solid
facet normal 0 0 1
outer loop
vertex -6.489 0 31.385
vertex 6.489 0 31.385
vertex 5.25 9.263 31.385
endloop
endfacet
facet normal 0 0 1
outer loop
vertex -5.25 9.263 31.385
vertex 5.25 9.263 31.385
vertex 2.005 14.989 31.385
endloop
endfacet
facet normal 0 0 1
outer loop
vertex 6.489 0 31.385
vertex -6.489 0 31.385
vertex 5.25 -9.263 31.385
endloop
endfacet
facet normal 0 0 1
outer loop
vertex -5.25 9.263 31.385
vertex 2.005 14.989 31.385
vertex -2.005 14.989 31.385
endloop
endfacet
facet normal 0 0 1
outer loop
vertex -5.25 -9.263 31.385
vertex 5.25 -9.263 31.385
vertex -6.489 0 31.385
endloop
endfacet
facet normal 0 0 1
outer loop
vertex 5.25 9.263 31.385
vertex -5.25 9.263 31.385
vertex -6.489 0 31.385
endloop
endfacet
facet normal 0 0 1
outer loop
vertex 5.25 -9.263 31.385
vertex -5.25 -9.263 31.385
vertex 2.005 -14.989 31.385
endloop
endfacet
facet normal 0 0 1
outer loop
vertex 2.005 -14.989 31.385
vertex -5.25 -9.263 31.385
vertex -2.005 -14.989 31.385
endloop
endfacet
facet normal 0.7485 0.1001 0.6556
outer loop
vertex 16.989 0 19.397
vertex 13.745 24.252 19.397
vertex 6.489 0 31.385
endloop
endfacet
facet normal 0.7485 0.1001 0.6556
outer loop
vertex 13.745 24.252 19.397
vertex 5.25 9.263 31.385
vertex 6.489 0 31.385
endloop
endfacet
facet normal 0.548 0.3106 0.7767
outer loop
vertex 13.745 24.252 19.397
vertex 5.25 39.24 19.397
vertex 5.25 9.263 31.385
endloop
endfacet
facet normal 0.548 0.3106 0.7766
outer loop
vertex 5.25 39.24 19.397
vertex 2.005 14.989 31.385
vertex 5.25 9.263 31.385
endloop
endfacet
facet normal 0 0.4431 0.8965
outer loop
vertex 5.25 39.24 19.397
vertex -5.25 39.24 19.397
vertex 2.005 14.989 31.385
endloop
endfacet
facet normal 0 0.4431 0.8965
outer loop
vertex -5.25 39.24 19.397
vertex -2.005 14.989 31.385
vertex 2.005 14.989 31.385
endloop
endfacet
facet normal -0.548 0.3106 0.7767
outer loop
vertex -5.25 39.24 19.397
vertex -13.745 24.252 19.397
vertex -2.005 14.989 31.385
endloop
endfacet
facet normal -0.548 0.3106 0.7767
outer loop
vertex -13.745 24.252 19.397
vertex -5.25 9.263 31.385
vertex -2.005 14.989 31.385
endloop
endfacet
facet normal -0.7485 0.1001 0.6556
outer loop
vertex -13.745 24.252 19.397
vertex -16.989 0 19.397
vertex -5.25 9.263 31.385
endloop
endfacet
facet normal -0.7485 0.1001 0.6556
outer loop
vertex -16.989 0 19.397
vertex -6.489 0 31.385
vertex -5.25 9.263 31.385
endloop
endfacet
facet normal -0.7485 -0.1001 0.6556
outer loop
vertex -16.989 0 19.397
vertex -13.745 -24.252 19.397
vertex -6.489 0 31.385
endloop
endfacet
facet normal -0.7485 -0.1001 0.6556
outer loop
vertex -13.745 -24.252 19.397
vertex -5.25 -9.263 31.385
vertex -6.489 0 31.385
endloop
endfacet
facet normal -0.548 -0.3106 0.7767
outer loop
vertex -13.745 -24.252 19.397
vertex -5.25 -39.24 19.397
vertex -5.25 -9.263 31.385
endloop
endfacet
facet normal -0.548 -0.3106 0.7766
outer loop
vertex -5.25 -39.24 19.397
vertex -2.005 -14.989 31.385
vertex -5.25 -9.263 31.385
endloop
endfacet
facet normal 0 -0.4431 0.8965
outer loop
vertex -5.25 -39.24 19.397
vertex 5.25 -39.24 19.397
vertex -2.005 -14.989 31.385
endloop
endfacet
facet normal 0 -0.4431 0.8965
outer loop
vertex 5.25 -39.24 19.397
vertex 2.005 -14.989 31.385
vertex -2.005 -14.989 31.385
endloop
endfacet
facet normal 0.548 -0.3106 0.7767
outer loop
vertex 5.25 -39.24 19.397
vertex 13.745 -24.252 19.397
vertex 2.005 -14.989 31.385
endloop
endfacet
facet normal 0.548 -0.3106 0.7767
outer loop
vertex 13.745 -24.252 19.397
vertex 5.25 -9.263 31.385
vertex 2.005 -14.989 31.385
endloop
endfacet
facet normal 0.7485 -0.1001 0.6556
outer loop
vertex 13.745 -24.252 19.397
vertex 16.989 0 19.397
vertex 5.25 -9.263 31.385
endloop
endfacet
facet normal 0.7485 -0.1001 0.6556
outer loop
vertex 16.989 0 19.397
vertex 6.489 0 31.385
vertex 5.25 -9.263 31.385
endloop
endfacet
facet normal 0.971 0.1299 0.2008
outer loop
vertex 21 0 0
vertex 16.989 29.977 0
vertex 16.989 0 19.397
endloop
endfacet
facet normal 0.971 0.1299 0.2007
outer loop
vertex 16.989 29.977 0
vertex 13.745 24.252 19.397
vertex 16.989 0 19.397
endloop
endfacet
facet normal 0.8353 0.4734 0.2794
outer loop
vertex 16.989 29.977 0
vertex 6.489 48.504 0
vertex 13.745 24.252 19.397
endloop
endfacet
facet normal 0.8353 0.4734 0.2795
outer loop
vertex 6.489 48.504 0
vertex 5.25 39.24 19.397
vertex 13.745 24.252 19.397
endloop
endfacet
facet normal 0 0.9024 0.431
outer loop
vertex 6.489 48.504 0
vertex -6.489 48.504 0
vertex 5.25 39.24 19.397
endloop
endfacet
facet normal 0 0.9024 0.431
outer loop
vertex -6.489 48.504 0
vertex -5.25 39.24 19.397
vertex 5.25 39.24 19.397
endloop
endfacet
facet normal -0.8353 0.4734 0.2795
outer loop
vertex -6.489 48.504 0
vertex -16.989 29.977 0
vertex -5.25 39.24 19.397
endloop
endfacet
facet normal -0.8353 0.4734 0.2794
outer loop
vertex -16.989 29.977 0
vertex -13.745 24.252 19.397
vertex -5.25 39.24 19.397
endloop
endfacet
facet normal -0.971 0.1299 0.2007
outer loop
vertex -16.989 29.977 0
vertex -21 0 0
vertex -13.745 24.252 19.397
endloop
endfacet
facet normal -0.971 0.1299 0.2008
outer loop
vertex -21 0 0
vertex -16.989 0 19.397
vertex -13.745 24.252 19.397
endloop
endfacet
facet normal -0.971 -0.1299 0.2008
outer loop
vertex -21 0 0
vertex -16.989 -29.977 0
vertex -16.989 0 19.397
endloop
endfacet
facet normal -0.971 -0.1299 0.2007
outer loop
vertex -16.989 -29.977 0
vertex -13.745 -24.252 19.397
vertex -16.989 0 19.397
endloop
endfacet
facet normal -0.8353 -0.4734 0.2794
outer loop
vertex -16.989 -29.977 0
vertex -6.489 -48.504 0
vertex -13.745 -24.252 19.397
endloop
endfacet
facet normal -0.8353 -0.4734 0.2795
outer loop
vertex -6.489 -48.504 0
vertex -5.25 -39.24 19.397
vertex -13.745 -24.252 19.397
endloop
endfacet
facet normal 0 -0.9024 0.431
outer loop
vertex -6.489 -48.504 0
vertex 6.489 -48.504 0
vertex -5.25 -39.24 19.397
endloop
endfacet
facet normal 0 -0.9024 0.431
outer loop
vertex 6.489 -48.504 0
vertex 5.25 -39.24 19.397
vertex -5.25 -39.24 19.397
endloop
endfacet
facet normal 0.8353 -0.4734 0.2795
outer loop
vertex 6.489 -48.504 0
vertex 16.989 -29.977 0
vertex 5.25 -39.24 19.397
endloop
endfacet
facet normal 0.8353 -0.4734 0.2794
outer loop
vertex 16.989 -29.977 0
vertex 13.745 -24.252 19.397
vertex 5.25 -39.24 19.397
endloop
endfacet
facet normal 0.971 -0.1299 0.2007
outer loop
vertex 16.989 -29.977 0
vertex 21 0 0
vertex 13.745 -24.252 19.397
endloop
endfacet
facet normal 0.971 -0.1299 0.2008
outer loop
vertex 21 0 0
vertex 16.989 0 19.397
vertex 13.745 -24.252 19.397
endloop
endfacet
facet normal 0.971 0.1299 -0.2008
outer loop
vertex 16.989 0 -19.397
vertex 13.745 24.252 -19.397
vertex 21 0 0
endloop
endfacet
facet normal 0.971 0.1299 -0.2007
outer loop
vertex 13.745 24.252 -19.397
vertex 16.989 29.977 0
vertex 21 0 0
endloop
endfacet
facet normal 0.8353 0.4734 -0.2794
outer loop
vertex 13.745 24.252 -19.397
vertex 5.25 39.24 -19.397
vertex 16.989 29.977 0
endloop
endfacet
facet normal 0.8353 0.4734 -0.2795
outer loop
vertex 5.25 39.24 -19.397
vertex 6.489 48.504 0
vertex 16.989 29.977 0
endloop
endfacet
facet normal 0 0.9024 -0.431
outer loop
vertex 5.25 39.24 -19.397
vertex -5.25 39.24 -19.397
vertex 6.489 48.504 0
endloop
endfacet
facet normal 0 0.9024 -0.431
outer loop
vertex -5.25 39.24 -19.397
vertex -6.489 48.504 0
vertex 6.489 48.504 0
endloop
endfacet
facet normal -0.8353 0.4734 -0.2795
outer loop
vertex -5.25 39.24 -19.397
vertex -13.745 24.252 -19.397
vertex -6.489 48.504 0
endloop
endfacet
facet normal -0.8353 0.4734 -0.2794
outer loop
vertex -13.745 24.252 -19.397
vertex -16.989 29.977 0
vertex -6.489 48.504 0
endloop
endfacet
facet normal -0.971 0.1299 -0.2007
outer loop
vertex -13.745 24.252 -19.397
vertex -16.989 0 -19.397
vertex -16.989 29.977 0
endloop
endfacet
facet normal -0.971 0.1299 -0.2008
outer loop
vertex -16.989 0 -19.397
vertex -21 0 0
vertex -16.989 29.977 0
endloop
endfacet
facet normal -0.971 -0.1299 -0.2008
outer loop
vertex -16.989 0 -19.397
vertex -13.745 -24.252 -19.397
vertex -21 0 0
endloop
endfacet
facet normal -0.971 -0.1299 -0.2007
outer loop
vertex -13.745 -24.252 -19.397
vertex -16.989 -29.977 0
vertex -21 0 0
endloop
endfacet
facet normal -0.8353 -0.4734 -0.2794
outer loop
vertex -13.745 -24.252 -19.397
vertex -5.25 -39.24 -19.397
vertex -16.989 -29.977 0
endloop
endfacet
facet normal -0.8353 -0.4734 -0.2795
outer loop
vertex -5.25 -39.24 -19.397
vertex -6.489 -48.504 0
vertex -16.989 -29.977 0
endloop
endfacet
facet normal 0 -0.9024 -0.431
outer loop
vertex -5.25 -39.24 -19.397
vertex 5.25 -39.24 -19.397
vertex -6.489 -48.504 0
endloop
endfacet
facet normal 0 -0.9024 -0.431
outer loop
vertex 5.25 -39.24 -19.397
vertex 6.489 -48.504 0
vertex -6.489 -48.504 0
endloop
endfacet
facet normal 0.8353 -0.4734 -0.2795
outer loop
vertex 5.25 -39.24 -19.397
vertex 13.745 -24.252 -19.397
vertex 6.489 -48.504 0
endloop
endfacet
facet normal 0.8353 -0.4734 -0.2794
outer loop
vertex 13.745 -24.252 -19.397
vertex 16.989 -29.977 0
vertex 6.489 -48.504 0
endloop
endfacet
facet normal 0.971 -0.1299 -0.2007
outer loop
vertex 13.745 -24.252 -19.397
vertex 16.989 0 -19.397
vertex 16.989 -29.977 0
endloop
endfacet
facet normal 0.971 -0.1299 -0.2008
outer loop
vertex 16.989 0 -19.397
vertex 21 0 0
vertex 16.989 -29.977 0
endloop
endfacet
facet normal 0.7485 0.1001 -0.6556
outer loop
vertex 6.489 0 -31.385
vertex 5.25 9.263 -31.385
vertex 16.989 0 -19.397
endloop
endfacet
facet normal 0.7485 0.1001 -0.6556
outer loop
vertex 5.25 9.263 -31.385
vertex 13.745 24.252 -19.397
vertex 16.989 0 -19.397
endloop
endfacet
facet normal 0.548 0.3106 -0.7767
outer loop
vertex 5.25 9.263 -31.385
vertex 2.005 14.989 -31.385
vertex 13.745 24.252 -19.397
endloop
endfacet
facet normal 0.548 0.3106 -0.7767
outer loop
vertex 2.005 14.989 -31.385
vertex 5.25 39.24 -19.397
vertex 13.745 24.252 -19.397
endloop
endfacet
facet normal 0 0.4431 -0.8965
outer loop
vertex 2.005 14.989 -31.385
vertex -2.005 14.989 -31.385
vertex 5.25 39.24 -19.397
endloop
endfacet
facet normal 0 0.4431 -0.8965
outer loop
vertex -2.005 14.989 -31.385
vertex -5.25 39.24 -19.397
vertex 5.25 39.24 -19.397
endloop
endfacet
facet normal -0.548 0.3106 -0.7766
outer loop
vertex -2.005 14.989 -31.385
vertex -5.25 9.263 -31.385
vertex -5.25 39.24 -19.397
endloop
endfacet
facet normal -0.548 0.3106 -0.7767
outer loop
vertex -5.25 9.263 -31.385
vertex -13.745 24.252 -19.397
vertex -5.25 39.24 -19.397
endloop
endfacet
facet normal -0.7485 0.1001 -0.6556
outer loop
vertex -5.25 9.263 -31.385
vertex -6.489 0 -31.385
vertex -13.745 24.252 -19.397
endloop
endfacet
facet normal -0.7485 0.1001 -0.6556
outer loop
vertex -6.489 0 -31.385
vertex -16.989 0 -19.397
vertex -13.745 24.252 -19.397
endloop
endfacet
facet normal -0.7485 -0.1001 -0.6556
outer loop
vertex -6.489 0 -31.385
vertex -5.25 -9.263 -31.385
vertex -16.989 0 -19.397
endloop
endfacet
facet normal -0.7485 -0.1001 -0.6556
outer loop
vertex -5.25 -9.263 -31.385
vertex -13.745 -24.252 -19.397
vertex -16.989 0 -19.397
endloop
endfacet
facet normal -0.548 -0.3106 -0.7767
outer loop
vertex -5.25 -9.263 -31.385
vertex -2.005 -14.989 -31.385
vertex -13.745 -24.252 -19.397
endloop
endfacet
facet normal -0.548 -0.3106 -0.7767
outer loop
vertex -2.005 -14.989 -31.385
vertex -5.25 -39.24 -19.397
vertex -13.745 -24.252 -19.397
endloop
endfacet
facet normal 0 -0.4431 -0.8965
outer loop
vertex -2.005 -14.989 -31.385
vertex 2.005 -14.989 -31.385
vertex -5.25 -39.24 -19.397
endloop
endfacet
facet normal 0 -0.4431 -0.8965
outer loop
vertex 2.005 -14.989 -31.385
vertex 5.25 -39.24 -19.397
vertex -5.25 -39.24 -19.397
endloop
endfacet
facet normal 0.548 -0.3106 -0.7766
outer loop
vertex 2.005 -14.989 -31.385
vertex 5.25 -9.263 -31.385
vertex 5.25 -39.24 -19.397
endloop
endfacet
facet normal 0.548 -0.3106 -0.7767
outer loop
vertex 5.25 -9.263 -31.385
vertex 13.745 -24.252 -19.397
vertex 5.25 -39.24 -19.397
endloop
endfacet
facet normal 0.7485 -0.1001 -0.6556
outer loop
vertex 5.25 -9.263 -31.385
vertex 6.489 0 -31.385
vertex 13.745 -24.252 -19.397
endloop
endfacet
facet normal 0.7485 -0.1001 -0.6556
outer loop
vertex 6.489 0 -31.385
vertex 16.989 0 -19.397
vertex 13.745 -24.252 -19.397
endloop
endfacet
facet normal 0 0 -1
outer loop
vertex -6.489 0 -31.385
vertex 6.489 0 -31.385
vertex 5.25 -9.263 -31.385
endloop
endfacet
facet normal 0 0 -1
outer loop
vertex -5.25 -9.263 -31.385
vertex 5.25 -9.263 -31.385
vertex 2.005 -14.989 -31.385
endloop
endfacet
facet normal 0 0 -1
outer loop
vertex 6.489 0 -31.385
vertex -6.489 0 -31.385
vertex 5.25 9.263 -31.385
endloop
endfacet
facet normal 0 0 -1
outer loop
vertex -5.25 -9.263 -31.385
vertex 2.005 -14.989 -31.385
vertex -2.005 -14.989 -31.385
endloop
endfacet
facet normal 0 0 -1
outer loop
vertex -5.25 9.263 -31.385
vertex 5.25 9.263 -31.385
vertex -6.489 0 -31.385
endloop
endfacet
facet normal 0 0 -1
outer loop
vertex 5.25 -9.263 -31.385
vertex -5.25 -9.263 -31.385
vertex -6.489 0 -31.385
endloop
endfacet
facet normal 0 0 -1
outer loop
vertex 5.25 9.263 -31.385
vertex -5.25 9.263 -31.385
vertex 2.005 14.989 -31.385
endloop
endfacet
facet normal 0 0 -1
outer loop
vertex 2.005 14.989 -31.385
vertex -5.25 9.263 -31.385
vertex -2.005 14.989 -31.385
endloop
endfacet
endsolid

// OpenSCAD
// Generated by SolidPython 1.0.1 on 2020-07-29 00:46:48


scale(v = [7, 17, 11]) {
	sphere(r = 3);
}
/***********************************************
*********      SolidPython code:      **********
************************************************
 
# import packages: SolidPython
from solid import *
from solid.utils import *
from itertools import chain, combinations, permutations


class Resize:

    def __init__(self, scad_file):
        self.scad_file = scad_file
        #self.scad_file = import_scad(scad_file)
        # cone/cylinder param:
        self.r1 = 0
        self.r2 = 0
        self.h = 0
        # rectangular prism param:
        self.w = 0
        self.l = 0
        # ellipse param:
        self.r = 0

    # import OpenScad code (file name corresponds to shape)


    # classify shape + parameters
    def assign(self, param1, param2, param3):
        if self.scad_file == 'cone.scad':
            self.r1 = param1
            self.r2 = param2
            self.h = param3
        elif self.scad_file == 'cylinder.scad':
            self.r1 = param1
            self.r2 = param2
            self.h = param3
        elif self.scad_file == 'rectangularPrism.scad':
            self.h = param1
            self.l = param2
            self.w = param3
        else:
            self.r = param1
            self.h = param2

    # resize parameters
    def iterate(self):
        x = range(3, 20, 2)
        i = 1
        if self.scad_file == 'cone.scad':
            tempList = list(permutations(x, 2))
            for temp in tempList:
                param1 = temp[0]
                param2 = temp[1]
                filepath = 'produced_scad_files/' + 'cone' + str(param1) + '_' + str(param2) + '_' + '.scad'
                scad_render_to_file(cylinder(h=param1, r1=param2, r2=0), filepath)

        elif self.scad_file == 'cylinder.scad':
            tempList = list(permutations(x, 3))
            for temp in tempList:
                param1 = temp[0]
                param2 = temp[1]
                filepath = 'produced_scad_files/' + 'cylinder' + str(param1) + '_' + str(param2) + '_' + '.scad'
                scad_render_to_file(cylinder(h=param1, r1=param2, r2=param2), filepath)

        elif self.scad_file == 'rectangularPrism.scad':
            tempList = list(permutations(x, 3))
            for temp in tempList:
                param1 = temp[0]
                param2 = temp[1]
                param3 = temp[2]
                filepath = 'produced_scad_files/' + 'rectangularPrism' + str(param1) + '_' + str(param2) + '_' + str(
                    param3) + '.scad'
                scad_render_to_file(cube(size=(param1, param2, param3)), filepath)

        elif self.scad_file == 'ellipse.scad':
            tempList = list(permutations(x, 4))
            for temp in tempList:
                param1 = temp[0]
                param2 = temp[1]
                param3 = temp[2]
                param4 = temp[3]
                filepath = 'produced_scad_files/' + 'ellipse' + str(param1) + '_' + str(param2) + '_' + str(param3) + '_' + str(param4) + '.scad'
                scad_render_to_file(scale([param1, param2, param3])(sphere(r=param4)), filepath)

    def render_to_scadfile(self):
        scad_render_to_file(scad, 'example.scad') 
 
************************************************/
